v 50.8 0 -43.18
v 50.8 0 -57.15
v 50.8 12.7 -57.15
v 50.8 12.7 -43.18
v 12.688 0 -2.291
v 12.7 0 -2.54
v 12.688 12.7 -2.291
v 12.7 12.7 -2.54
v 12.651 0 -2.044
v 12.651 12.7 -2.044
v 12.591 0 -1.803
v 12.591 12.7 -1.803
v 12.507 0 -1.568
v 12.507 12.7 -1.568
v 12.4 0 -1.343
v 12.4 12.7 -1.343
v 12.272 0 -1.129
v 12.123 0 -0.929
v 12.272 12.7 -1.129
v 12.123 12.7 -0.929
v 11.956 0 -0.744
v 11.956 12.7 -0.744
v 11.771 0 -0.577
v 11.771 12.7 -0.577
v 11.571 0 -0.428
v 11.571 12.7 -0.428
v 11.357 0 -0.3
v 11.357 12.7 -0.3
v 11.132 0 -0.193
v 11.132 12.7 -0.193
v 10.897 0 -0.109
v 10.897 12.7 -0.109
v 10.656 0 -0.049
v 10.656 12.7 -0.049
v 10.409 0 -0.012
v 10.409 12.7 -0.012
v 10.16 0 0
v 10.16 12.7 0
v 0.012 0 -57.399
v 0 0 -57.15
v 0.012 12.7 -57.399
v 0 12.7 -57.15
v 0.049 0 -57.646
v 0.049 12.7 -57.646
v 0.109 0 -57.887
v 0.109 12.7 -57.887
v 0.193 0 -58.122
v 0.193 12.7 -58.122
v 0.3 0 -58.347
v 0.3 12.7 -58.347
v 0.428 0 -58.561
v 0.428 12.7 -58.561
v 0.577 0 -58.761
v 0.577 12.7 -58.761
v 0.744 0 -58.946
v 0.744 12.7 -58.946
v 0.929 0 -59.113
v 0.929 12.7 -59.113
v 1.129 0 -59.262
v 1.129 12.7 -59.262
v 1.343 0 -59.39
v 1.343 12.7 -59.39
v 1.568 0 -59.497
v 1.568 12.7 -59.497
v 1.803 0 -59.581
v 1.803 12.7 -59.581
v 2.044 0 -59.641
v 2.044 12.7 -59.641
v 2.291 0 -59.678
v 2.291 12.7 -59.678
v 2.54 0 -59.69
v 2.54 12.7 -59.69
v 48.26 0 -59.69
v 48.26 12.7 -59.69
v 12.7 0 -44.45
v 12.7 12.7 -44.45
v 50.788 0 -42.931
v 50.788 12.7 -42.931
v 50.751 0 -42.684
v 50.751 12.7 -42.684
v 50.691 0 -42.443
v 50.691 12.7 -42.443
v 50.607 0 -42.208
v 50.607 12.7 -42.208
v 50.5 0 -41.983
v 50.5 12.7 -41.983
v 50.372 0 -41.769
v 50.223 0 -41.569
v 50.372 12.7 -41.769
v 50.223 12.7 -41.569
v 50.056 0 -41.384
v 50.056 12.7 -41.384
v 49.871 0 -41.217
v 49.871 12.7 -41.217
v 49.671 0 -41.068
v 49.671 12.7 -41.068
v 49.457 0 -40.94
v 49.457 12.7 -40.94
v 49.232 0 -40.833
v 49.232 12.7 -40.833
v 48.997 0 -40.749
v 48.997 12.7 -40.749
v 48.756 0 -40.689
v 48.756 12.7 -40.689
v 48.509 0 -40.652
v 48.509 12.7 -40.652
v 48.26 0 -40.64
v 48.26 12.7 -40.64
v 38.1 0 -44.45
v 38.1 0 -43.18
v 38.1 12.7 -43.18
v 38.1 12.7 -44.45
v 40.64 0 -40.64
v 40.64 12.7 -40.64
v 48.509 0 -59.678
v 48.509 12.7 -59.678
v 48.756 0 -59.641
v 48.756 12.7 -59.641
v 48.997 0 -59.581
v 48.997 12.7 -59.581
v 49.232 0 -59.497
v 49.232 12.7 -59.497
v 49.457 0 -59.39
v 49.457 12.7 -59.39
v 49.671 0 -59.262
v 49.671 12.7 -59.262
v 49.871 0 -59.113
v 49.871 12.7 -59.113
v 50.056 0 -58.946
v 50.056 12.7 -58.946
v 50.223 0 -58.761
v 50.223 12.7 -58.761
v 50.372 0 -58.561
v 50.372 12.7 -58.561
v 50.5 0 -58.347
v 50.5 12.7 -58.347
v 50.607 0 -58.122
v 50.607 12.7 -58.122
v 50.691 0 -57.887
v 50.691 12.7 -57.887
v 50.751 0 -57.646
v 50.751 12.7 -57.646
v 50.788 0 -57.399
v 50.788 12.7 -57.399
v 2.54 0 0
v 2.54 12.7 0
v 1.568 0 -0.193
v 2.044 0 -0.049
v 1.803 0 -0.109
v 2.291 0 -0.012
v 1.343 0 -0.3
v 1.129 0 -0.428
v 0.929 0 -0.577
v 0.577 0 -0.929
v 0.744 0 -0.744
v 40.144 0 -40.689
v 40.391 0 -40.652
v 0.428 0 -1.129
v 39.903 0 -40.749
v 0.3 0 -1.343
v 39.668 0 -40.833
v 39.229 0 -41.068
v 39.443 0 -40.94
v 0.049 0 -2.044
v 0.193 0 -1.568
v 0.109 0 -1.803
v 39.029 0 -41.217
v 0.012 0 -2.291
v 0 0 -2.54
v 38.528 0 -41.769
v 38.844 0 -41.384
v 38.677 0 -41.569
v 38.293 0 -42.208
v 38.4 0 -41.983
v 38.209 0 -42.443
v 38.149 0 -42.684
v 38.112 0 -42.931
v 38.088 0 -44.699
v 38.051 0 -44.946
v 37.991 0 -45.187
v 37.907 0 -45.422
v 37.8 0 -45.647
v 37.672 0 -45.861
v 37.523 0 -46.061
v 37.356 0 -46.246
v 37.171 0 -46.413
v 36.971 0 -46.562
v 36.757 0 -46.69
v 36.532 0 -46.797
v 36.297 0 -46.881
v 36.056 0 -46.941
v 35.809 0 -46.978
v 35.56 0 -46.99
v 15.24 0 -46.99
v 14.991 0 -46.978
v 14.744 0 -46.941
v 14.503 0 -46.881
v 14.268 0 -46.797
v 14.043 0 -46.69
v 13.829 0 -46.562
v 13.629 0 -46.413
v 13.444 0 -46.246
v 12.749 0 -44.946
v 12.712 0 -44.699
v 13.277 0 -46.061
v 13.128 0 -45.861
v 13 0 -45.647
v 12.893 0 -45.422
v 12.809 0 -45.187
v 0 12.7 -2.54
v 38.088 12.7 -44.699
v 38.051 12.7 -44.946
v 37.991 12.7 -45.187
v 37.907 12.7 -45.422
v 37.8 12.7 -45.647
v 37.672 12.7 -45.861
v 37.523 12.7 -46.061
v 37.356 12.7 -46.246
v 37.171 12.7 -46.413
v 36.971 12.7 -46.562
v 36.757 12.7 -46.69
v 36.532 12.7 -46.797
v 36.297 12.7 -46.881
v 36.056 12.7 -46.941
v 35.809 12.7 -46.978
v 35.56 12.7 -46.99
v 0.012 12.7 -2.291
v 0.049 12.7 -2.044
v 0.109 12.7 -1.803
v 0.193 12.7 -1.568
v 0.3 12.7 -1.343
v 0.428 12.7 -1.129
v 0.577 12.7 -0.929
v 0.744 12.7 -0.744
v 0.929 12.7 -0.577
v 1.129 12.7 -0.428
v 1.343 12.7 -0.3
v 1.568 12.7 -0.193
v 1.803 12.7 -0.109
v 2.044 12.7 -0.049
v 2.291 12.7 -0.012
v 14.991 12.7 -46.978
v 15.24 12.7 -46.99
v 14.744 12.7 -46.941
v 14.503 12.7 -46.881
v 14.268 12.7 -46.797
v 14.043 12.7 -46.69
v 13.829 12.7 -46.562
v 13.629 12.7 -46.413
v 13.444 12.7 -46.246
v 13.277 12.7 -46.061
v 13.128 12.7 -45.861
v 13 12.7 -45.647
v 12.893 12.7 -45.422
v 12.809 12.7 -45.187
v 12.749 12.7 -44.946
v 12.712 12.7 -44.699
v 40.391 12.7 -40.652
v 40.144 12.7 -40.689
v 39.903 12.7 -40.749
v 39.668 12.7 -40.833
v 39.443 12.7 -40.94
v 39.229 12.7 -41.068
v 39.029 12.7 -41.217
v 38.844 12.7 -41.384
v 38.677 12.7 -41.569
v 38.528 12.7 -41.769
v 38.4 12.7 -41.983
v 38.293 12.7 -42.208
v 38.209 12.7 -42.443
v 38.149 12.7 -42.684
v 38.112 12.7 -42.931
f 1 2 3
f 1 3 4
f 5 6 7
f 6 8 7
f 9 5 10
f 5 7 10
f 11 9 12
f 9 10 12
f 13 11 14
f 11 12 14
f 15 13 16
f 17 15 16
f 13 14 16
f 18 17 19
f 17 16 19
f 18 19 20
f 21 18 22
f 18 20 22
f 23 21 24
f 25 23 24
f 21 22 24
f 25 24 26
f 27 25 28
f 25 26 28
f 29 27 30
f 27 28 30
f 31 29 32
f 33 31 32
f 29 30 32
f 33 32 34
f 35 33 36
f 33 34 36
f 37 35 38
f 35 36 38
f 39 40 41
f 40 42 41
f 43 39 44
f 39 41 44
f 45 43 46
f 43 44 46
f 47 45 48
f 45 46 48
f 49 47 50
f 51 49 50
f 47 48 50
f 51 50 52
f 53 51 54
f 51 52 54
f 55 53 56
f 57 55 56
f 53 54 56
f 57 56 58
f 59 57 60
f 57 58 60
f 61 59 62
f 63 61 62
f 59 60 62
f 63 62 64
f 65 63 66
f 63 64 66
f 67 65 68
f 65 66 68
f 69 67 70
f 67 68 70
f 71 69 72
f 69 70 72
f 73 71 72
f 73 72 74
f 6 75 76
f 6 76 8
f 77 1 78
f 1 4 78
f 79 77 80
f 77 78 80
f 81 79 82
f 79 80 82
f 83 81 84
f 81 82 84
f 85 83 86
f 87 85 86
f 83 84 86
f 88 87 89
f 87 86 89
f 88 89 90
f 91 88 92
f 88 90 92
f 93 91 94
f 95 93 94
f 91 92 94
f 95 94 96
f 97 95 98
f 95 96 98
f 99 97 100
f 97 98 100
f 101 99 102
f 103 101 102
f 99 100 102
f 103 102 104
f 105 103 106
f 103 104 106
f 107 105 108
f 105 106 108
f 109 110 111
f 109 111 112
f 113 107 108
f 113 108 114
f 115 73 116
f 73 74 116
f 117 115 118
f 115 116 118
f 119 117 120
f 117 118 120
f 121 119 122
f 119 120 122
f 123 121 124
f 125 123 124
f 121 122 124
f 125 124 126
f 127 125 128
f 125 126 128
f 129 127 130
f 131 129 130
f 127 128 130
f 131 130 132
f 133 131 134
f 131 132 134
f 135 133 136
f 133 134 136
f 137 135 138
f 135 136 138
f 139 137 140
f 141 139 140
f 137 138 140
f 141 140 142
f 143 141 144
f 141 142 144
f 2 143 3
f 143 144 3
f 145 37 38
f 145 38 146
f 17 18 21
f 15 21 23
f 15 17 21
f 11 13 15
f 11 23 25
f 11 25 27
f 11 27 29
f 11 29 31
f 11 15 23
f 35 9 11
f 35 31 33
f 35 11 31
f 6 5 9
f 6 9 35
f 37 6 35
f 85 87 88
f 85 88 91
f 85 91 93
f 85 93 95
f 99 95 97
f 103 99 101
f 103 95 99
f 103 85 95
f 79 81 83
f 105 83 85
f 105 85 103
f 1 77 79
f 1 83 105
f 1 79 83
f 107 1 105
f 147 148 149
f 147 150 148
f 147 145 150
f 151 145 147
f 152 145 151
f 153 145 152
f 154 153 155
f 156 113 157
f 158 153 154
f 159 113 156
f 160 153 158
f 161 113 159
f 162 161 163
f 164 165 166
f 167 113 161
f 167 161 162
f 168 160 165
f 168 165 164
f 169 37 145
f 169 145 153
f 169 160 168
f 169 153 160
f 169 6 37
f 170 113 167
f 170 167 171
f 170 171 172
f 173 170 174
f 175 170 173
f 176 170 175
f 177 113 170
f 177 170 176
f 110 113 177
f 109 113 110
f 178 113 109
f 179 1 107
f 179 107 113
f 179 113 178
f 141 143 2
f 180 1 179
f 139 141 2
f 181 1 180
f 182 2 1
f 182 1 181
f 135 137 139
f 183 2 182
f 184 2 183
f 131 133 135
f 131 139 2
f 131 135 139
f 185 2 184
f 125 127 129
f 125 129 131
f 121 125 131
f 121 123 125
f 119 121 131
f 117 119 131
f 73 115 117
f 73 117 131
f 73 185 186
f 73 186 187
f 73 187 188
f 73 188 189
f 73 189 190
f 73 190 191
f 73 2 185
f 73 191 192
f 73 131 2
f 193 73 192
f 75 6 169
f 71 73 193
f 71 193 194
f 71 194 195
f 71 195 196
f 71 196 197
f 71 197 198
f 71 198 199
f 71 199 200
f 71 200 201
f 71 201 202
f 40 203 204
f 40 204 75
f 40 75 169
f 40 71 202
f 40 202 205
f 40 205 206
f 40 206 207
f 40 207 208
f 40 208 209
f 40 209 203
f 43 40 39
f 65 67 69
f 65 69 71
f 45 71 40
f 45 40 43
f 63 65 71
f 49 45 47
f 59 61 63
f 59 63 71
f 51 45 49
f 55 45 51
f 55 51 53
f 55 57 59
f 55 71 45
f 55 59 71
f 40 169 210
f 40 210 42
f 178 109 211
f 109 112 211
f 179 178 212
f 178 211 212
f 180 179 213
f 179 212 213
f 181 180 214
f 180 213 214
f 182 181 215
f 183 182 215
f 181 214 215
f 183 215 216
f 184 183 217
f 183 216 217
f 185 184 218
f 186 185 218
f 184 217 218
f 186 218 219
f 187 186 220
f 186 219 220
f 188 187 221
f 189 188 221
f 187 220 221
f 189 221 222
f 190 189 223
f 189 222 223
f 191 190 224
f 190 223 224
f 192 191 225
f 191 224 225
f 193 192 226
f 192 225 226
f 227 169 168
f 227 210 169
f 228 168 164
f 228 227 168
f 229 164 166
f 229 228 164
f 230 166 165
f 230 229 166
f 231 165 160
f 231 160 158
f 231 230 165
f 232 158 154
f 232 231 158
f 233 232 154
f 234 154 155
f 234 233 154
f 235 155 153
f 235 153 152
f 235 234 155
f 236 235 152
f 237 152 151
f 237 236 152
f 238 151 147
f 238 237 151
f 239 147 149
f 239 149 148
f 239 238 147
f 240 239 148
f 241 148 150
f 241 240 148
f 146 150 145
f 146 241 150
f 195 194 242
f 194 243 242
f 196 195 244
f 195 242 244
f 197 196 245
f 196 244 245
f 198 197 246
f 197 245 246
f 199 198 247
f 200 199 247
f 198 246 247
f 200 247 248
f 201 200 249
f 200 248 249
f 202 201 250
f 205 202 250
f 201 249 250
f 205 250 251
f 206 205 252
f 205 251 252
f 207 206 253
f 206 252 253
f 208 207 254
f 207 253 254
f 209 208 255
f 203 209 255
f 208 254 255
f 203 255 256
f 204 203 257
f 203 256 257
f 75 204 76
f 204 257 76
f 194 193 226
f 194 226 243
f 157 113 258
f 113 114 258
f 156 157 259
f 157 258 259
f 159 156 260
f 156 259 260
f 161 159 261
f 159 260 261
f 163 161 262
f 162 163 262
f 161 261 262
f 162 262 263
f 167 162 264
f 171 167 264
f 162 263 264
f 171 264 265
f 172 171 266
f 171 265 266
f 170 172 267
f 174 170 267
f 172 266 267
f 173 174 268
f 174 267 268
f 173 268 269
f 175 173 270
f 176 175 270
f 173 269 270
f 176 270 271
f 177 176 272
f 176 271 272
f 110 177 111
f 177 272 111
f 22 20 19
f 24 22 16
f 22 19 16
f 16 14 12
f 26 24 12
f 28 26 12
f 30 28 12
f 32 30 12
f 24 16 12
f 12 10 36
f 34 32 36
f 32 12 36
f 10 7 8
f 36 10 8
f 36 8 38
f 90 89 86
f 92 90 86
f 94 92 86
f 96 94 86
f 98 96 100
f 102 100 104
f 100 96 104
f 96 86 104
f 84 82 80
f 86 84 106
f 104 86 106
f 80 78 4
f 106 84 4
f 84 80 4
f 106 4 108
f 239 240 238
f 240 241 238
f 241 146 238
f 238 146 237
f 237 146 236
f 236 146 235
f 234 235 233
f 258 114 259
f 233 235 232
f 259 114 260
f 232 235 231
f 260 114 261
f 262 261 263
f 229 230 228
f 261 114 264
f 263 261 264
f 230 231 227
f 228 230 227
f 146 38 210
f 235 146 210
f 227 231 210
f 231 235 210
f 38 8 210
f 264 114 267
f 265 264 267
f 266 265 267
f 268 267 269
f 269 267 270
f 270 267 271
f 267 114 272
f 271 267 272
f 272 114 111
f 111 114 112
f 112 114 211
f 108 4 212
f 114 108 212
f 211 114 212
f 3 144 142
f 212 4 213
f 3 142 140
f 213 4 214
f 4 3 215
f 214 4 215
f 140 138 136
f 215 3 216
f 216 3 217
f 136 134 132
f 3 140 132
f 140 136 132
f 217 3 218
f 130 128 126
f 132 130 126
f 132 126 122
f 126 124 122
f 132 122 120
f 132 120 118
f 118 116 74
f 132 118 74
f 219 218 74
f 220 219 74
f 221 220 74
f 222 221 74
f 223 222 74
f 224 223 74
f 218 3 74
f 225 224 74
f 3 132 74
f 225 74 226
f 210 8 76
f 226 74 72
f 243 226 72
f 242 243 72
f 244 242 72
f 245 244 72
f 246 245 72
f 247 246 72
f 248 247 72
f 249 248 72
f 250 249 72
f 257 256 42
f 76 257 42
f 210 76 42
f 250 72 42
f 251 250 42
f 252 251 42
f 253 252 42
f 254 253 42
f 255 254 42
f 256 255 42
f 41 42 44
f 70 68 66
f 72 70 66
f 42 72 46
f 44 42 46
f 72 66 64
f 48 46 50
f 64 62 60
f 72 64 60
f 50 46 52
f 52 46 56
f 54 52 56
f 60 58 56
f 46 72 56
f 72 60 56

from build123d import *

# Parameters (mm, degrees)
BOSS_EXTRUDE1_DEPTH = 12.7
FILLET1_R           = 2.54


with BuildPart() as part:
    # Sketch1 → Boss-Extrude1 (new body)
    with BuildSketch(Plane(origin=(0, 0, 0), x_dir=(1, 0, 0), z_dir=(0, 1, 0))):
        Polygon((0, 0), (0, 59.69), (50.8, 59.69), (50.8, 40.64), (38.1, 40.64), (38.1, 46.99), (12.7, 46.99), (12.7, 0), align=None)
    extrude(amount=BOSS_EXTRUDE1_DEPTH)

    # Fillet1
    fillet1_edges = [part.edges().sort_by_distance(p)[0] for p in [
        (0, 6.35, 0),
        (0, 6.35, -59.69),
        (50.8, 6.35, -59.69),
        (50.8, 6.35, -40.64),
        (38.1, 6.35, -40.64),
        (38.1, 6.35, -46.99),
        (12.7, 6.35, -46.99),
        (12.7, 6.35, 0),
    ]]
    fillet(fillet1_edges, radius=FILLET1_R)


solid = part.part
